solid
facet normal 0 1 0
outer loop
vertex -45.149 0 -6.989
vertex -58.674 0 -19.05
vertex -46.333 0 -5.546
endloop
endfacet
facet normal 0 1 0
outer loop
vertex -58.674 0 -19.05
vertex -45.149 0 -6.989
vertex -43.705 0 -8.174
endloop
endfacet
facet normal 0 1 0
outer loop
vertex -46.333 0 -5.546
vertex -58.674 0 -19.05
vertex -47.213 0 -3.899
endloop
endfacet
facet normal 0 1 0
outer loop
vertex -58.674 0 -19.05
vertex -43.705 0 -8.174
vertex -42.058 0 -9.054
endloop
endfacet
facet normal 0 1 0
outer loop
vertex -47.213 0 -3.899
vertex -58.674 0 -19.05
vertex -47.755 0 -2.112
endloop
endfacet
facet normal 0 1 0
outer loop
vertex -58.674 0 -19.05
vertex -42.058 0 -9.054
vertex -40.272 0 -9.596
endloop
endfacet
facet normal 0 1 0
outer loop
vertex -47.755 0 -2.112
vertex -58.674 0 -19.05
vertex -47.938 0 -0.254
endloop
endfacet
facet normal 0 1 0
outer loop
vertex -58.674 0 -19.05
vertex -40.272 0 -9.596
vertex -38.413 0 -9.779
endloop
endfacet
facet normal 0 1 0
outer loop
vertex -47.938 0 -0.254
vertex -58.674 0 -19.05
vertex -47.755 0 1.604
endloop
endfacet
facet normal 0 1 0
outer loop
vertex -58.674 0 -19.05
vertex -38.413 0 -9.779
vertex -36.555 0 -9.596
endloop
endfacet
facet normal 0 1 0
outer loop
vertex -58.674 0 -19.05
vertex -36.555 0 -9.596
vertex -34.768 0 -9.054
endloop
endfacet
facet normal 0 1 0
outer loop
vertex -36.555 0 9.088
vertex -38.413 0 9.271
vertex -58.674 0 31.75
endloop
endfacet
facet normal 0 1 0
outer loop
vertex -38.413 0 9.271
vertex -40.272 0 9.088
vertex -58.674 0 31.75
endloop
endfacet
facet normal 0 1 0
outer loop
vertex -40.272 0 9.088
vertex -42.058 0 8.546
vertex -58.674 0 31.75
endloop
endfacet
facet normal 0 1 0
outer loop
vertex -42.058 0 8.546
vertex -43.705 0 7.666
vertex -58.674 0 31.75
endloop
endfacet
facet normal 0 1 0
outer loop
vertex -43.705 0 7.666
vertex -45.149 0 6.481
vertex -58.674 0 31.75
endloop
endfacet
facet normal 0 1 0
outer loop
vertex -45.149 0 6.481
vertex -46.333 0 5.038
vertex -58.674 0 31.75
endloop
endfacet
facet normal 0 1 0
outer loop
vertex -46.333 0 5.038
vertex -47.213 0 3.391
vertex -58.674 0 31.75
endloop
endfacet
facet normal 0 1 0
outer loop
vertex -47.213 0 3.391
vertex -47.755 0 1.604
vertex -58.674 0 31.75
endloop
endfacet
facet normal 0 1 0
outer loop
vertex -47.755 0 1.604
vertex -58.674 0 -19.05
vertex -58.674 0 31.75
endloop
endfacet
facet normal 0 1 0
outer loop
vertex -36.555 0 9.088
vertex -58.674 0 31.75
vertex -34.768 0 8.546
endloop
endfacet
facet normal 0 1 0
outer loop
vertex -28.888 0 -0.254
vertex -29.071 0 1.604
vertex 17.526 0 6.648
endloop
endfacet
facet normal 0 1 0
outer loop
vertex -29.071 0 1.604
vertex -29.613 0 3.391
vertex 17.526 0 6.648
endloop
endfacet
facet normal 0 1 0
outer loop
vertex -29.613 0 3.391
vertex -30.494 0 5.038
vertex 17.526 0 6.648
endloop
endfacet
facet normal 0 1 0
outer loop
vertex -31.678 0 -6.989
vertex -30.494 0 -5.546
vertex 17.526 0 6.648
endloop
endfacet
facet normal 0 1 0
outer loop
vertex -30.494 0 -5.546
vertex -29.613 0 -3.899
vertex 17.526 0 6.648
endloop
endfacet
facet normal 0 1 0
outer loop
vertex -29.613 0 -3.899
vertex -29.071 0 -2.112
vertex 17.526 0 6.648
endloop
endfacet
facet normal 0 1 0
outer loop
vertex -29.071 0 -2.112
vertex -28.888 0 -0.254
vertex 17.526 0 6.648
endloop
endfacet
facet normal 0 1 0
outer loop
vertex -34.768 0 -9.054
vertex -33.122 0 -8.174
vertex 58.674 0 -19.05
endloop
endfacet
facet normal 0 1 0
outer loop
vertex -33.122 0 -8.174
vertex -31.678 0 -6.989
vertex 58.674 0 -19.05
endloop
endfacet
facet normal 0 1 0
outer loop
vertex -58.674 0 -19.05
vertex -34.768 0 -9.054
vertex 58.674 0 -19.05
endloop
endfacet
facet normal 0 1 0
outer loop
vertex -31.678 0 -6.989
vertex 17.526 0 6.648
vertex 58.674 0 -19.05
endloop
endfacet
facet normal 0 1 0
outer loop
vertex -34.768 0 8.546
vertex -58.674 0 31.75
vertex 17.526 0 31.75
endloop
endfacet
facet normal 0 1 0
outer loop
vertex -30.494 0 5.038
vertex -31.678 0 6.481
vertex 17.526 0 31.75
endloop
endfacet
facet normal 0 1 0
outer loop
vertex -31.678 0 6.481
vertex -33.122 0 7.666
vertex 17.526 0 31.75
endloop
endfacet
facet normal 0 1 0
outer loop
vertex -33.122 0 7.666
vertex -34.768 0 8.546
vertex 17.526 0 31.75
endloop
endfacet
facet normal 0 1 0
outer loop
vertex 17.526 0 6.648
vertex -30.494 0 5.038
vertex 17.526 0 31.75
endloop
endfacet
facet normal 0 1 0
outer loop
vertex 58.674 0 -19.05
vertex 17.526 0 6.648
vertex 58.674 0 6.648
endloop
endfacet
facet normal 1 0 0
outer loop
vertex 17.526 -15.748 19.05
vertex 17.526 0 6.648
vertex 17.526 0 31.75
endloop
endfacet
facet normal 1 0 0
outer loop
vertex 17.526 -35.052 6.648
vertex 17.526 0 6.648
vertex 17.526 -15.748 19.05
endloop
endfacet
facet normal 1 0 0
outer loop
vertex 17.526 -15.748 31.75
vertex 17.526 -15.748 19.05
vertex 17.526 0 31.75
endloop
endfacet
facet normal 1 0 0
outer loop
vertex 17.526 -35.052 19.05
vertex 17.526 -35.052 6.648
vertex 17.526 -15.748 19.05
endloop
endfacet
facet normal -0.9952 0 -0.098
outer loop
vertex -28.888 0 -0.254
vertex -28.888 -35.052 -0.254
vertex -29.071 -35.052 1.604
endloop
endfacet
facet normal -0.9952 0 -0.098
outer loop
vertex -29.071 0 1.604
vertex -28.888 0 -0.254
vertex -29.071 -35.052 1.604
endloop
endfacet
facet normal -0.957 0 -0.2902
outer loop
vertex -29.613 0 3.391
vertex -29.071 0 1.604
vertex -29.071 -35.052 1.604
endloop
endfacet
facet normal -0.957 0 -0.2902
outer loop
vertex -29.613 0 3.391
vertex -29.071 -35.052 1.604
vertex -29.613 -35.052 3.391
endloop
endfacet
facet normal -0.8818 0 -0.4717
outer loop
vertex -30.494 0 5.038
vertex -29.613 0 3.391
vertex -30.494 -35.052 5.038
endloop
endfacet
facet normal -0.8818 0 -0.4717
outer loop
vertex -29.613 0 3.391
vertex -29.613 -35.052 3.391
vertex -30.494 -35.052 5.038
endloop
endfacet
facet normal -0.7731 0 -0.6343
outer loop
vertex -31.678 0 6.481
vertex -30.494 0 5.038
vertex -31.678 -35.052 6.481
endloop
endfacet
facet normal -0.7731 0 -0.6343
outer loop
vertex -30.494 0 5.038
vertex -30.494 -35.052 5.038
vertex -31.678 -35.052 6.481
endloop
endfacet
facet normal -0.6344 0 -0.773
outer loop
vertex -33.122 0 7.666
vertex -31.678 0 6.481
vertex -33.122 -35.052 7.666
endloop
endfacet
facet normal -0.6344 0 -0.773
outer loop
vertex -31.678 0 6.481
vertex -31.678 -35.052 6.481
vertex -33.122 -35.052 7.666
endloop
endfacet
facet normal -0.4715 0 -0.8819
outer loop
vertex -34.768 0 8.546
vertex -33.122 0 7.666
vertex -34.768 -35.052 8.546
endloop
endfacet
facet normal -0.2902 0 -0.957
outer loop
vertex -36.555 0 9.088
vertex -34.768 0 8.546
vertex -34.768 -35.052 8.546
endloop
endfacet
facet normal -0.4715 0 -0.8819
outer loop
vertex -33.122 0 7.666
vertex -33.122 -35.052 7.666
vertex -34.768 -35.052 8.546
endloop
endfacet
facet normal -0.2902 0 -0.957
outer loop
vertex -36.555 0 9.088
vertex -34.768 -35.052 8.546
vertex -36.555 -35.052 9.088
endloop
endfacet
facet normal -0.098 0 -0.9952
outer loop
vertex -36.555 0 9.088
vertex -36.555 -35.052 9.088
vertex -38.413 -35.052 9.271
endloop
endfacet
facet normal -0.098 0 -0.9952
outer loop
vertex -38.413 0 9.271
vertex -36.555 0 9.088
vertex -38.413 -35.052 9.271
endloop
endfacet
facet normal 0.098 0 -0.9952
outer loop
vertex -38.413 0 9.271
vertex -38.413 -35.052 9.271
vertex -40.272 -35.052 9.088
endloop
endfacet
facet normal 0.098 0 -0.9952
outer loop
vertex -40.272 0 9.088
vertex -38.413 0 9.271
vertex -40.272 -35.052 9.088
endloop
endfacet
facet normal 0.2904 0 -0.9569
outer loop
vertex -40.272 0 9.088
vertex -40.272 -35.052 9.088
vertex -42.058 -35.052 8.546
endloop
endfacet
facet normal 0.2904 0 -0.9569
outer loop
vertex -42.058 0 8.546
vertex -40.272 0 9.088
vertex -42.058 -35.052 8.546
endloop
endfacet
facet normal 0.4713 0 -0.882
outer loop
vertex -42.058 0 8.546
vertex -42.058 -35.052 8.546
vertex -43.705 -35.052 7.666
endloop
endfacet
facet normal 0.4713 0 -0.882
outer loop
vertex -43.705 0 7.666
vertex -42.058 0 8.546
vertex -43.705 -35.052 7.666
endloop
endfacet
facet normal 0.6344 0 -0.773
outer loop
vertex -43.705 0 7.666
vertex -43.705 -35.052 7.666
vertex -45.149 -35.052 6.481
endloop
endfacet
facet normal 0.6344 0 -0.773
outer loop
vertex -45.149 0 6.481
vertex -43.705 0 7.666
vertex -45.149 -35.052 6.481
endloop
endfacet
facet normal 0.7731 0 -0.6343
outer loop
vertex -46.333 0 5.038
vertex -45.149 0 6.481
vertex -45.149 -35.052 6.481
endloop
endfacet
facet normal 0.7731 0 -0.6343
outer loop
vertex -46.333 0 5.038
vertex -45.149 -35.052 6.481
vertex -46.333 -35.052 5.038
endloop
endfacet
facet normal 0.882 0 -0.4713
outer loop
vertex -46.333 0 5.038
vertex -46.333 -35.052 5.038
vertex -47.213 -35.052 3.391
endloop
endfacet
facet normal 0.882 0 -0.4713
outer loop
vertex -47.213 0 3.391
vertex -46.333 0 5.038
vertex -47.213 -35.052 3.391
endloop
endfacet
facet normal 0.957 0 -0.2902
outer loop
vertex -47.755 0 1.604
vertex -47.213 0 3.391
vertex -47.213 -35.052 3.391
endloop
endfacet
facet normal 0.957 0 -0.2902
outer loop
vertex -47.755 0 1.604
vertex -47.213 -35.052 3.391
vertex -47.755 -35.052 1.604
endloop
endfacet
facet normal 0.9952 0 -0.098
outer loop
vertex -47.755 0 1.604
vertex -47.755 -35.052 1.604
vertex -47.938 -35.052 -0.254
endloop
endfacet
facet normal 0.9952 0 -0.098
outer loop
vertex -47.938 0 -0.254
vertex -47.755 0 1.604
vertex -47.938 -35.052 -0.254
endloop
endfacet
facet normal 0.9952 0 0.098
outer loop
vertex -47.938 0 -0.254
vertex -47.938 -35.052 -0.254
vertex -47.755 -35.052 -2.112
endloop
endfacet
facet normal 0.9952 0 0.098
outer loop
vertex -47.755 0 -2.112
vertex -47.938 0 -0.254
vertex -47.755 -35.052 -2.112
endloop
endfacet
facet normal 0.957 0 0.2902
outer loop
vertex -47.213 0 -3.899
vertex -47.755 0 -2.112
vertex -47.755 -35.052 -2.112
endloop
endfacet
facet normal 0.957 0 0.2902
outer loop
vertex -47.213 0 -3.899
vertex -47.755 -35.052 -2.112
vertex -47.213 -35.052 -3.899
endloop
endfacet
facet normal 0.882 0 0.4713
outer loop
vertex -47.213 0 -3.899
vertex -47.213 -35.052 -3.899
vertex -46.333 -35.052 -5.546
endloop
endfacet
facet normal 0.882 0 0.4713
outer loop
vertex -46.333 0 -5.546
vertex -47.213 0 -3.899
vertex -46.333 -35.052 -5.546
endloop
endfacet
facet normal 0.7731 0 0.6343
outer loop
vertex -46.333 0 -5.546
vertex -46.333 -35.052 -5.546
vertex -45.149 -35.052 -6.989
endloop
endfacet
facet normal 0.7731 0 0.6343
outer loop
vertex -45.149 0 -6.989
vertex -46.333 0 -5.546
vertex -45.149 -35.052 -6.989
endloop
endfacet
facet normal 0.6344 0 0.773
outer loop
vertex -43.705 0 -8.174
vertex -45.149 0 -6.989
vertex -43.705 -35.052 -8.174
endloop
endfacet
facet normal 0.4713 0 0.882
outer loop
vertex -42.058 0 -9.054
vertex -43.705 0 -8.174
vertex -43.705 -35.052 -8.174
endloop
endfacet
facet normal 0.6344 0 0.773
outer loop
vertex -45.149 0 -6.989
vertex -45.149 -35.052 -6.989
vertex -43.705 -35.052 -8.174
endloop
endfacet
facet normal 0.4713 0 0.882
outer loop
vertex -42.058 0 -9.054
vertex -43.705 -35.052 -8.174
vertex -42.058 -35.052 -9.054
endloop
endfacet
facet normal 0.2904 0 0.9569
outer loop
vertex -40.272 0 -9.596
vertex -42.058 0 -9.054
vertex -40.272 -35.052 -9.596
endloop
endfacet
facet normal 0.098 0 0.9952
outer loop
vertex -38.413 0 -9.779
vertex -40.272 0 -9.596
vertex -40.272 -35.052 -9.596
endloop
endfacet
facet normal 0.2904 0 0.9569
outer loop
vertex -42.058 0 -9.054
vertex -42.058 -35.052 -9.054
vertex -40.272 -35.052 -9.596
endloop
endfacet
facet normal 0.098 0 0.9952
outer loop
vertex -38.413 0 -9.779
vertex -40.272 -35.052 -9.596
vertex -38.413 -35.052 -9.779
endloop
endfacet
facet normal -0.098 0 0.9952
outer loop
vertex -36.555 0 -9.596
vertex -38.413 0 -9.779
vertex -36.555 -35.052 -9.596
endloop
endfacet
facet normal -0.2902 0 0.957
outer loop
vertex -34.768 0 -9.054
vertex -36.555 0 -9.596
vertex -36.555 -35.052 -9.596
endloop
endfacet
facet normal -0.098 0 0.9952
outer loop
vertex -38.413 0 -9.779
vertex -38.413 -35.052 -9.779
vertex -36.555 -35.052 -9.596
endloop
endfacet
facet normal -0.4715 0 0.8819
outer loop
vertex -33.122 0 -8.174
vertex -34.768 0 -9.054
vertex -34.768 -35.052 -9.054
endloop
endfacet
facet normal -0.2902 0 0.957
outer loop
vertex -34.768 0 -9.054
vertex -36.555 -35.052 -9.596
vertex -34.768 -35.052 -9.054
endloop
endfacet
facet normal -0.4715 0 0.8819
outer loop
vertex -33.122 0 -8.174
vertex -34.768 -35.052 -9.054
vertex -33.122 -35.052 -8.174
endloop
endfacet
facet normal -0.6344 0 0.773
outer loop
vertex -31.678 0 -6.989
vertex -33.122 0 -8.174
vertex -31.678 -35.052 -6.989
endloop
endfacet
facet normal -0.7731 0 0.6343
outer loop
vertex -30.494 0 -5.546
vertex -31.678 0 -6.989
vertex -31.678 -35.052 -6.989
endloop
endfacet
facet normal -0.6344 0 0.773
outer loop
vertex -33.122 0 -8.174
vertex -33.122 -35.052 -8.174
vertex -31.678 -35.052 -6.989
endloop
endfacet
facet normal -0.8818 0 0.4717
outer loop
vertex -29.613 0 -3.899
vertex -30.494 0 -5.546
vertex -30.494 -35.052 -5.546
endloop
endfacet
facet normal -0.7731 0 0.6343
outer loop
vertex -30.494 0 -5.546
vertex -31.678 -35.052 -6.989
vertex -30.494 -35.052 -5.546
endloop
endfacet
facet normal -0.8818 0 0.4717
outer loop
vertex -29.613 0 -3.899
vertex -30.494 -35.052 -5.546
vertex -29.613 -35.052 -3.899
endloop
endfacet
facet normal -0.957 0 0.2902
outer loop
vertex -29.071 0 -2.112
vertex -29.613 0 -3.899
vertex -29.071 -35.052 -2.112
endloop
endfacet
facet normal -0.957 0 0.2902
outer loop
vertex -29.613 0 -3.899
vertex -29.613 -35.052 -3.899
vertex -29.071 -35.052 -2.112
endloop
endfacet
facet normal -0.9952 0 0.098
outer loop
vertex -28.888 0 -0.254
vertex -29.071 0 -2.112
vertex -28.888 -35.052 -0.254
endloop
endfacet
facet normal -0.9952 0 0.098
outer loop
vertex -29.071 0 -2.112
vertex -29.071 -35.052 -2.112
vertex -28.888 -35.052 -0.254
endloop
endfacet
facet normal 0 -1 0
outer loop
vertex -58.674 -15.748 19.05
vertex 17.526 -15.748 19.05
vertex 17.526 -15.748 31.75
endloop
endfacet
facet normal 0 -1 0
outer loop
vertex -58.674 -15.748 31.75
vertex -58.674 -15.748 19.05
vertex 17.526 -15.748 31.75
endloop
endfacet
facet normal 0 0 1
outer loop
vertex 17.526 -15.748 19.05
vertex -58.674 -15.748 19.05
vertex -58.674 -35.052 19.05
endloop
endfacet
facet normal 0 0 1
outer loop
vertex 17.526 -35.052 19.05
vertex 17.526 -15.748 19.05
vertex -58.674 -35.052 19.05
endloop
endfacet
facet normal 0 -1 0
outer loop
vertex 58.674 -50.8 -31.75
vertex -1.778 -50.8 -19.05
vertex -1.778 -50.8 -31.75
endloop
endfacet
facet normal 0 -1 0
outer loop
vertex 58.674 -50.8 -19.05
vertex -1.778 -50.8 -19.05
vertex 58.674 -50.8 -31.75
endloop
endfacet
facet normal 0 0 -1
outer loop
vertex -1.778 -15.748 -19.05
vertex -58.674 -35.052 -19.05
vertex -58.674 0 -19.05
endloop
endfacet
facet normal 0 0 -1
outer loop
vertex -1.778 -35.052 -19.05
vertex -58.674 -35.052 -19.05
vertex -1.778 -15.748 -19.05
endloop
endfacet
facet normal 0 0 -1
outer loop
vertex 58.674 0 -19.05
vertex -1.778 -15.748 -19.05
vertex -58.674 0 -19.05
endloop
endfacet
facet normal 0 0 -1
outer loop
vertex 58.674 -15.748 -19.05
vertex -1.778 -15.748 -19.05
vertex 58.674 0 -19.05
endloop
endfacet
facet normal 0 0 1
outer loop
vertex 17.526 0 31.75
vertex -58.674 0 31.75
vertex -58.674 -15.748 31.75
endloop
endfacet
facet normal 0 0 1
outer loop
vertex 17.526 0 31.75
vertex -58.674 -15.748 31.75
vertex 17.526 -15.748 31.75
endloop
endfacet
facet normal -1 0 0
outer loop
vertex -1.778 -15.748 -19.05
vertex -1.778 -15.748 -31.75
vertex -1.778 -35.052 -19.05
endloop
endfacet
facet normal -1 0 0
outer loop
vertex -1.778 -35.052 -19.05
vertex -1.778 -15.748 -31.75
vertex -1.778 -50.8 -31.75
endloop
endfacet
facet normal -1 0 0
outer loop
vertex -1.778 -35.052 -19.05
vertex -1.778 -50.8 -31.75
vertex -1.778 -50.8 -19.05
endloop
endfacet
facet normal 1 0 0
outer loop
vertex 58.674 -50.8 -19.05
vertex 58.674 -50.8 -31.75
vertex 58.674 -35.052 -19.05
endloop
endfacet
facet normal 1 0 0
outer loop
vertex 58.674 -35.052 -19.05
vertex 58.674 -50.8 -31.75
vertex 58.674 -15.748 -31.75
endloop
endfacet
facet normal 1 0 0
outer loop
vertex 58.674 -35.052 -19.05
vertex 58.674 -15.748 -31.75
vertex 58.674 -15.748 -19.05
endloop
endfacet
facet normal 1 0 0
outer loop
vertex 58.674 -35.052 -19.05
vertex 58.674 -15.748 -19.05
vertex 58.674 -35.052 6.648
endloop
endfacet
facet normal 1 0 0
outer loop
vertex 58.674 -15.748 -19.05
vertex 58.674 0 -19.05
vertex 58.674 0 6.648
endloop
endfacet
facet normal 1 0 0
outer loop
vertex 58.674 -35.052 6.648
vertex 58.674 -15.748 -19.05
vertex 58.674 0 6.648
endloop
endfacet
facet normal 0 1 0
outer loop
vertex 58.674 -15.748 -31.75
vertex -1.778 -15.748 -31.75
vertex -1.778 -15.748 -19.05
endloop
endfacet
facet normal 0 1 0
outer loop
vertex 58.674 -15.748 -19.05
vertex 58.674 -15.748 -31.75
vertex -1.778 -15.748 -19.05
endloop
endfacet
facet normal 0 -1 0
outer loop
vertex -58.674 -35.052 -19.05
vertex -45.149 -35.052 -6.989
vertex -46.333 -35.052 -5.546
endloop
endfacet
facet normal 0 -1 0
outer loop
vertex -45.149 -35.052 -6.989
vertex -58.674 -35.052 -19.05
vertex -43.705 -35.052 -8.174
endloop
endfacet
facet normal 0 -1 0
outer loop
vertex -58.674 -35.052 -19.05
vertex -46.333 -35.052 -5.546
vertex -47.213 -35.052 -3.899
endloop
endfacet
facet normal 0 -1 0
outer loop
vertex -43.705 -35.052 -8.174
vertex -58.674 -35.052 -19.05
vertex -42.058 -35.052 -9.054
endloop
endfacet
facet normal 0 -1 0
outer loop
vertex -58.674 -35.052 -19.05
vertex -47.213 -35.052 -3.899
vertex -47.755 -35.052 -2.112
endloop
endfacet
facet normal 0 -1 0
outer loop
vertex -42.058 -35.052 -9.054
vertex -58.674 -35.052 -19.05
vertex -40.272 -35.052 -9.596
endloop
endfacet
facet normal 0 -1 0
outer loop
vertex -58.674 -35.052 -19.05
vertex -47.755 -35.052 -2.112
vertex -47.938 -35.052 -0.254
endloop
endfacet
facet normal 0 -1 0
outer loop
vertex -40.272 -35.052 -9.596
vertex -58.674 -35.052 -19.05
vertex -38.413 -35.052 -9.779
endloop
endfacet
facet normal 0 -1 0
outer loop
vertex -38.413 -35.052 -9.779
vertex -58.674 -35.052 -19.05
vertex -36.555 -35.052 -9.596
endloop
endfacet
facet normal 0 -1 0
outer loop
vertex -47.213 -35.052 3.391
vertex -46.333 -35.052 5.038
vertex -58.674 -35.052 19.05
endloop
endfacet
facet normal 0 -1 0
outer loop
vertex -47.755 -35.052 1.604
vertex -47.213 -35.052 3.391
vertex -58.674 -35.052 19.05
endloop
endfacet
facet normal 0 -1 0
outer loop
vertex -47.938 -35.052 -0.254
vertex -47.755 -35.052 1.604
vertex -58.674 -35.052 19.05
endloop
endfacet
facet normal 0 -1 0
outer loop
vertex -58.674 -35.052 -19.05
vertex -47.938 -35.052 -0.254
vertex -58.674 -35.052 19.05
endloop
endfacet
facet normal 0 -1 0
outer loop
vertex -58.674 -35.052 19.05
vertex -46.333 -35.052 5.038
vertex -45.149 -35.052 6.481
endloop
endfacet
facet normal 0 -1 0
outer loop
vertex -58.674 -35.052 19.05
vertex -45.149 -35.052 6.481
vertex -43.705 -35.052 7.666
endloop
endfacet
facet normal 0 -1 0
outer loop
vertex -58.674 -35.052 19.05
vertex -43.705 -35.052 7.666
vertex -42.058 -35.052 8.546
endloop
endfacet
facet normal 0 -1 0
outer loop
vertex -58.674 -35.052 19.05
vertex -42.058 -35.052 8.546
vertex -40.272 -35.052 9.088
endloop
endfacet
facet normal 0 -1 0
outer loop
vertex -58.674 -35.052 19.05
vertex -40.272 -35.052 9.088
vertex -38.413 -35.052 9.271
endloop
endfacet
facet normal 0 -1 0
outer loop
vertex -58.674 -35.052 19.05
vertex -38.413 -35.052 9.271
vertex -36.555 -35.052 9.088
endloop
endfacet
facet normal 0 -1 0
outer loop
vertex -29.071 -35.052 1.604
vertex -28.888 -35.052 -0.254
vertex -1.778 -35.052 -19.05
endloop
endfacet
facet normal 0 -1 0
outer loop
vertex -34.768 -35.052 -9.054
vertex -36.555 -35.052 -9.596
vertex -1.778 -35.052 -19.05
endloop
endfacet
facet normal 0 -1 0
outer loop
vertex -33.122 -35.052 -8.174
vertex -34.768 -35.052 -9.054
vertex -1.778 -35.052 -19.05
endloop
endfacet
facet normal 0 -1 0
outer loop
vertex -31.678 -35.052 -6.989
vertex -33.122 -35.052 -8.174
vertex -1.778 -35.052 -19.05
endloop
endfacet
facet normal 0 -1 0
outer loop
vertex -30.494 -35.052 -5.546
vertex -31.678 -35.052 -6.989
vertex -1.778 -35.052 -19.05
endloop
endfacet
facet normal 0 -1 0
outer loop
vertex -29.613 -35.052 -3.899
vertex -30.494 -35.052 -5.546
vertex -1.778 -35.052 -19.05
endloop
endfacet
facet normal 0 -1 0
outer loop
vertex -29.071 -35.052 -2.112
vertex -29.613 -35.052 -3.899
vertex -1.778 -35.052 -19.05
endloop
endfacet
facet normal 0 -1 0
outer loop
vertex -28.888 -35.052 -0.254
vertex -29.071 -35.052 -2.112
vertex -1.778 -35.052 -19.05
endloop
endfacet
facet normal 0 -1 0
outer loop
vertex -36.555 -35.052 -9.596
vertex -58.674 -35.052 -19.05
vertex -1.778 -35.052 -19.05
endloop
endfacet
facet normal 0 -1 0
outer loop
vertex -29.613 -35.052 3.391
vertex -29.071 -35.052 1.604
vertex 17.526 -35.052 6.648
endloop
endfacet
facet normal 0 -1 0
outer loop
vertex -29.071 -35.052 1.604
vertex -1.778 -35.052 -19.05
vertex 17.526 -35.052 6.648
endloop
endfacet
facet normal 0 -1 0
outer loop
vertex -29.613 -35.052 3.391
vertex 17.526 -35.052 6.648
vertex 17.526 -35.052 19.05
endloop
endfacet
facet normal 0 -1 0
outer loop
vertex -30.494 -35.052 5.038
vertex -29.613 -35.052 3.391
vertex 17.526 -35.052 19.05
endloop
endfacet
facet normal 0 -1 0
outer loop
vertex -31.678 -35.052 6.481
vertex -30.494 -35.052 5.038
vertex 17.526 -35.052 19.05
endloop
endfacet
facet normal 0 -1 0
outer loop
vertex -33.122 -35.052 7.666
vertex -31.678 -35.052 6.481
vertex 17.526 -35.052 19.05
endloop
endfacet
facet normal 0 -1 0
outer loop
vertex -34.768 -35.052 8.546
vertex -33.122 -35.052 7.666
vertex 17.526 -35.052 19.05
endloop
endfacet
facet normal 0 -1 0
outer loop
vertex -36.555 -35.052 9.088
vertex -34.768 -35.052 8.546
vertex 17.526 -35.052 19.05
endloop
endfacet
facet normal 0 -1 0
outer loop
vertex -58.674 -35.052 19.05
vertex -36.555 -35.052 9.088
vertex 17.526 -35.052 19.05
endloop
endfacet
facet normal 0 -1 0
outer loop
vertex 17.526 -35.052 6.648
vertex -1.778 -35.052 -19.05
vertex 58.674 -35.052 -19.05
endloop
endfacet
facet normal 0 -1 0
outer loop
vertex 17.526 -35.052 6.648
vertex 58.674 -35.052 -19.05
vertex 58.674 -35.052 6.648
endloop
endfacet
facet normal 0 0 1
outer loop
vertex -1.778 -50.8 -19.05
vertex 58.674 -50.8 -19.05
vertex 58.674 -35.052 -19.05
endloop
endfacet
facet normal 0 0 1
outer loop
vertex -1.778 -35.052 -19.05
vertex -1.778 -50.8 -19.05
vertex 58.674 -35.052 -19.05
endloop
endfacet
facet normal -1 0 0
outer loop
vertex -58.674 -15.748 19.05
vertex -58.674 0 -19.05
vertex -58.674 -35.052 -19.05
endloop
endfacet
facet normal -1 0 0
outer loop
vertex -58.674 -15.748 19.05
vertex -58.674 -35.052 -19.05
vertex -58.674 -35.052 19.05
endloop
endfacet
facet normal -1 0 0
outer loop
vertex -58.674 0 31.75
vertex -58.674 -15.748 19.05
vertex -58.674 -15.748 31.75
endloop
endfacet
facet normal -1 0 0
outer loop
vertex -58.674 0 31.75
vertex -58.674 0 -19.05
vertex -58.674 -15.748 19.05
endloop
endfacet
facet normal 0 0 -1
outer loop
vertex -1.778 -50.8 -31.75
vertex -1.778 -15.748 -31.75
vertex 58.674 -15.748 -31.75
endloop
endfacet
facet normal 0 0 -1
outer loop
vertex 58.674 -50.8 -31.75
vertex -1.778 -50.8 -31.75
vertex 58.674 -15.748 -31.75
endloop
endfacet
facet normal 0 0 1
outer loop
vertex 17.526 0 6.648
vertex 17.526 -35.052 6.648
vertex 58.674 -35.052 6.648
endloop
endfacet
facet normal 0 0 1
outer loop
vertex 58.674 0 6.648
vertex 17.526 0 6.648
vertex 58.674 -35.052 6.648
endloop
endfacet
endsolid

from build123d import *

# Parameters (mm, degrees)
F0_W      = 117.348
F0_H      = 63.5
F1_DEPTH  = 50.8
F2_W      = 35.052
F2_H      = 12.7
F3_DEPTH  = 117.349
F4_W      = 15.748
F4_H      = 38.1
F5_DEPTH  = 207
F6_DEPTH  = 117.349
F7_W      = 41.148
F7_H      = 25.4409682324
F8_DEPTH  = 35.053
F9_W      = 56.896
F9_H      = 12.7
F10_DEPTH = 50.801
F11_W     = 15.748
F11_H     = 12.7
F12_DEPTH = 117.349
F13_R     = 9.525
F14_DEPTH = 35.053


# Not quite as in the source:
# - an extrude ends at something that could not be found from the text; its depth is read off the source's solid


with BuildPart() as f1:
    # F0 (on Front) → F1 (new body)
    with BuildSketch(Plane.XZ):
        Rectangle(F0_W, F0_H)
    extrude(amount=F1_DEPTH)

    # F2 (on face) → F3 (cut, through all)
    with BuildSketch(Plane(origin=(-58.674, 0, 0), x_dir=(0, -1, 0), z_dir=(-1, 0, 0))):
        with Locations((33.274, 25.4)):
            Rectangle(F2_W, F2_H)
    extrude(amount=-F3_DEPTH, mode=Mode.SUBTRACT)

    # F4 (on face) → F5 (cut, through all)
    with BuildSketch(Plane.YZ.offset(58.674)):
        with Locations((-42.926, 0)):
            Rectangle(F4_W, F4_H)
    extrude(amount=F5_DEPTH, mode=Mode.SUBTRACT)

    # F4 (on face) → F6 (cut, through all)
    with BuildSketch(Plane.YZ.offset(58.674)):
        with Locations((-42.926, 0)):
            Rectangle(F4_W, F4_H)
    extrude(amount=-F6_DEPTH, mode=Mode.SUBTRACT)

    # F7 (on face) → F8 (cut, through all)
    with BuildSketch(Plane.XZ.offset(35.052)):
        with Locations((38.1, 19.3680736702)):
            Rectangle(F7_W, F7_H)
    extrude(amount=-F8_DEPTH, mode=Mode.SUBTRACT)

    # F9 (on face) → F10 (cut, through all)
    with BuildSketch(Plane.XZ.offset(50.8)):
        with Locations((-30.226, -25.4)):
            Rectangle(F9_W, F9_H)
    extrude(amount=-F10_DEPTH, mode=Mode.SUBTRACT)

    # F11 (on face) → F12 (cut, through all)
    with BuildSketch(Plane.YZ.offset(58.674)):
        with Locations((-7.874, -25.4)):
            Rectangle(F11_W, F11_H)
    extrude(amount=-F12_DEPTH, mode=Mode.SUBTRACT)

    # F13 (on face) → F14 (cut, through all)
    with BuildSketch(Plane.XZ.offset(35.052)):
        with Locations((-38.413323462, -0.254)):
            Circle(F13_R)
    extrude(amount=-F14_DEPTH, mode=Mode.SUBTRACT)


solid = f1.part
